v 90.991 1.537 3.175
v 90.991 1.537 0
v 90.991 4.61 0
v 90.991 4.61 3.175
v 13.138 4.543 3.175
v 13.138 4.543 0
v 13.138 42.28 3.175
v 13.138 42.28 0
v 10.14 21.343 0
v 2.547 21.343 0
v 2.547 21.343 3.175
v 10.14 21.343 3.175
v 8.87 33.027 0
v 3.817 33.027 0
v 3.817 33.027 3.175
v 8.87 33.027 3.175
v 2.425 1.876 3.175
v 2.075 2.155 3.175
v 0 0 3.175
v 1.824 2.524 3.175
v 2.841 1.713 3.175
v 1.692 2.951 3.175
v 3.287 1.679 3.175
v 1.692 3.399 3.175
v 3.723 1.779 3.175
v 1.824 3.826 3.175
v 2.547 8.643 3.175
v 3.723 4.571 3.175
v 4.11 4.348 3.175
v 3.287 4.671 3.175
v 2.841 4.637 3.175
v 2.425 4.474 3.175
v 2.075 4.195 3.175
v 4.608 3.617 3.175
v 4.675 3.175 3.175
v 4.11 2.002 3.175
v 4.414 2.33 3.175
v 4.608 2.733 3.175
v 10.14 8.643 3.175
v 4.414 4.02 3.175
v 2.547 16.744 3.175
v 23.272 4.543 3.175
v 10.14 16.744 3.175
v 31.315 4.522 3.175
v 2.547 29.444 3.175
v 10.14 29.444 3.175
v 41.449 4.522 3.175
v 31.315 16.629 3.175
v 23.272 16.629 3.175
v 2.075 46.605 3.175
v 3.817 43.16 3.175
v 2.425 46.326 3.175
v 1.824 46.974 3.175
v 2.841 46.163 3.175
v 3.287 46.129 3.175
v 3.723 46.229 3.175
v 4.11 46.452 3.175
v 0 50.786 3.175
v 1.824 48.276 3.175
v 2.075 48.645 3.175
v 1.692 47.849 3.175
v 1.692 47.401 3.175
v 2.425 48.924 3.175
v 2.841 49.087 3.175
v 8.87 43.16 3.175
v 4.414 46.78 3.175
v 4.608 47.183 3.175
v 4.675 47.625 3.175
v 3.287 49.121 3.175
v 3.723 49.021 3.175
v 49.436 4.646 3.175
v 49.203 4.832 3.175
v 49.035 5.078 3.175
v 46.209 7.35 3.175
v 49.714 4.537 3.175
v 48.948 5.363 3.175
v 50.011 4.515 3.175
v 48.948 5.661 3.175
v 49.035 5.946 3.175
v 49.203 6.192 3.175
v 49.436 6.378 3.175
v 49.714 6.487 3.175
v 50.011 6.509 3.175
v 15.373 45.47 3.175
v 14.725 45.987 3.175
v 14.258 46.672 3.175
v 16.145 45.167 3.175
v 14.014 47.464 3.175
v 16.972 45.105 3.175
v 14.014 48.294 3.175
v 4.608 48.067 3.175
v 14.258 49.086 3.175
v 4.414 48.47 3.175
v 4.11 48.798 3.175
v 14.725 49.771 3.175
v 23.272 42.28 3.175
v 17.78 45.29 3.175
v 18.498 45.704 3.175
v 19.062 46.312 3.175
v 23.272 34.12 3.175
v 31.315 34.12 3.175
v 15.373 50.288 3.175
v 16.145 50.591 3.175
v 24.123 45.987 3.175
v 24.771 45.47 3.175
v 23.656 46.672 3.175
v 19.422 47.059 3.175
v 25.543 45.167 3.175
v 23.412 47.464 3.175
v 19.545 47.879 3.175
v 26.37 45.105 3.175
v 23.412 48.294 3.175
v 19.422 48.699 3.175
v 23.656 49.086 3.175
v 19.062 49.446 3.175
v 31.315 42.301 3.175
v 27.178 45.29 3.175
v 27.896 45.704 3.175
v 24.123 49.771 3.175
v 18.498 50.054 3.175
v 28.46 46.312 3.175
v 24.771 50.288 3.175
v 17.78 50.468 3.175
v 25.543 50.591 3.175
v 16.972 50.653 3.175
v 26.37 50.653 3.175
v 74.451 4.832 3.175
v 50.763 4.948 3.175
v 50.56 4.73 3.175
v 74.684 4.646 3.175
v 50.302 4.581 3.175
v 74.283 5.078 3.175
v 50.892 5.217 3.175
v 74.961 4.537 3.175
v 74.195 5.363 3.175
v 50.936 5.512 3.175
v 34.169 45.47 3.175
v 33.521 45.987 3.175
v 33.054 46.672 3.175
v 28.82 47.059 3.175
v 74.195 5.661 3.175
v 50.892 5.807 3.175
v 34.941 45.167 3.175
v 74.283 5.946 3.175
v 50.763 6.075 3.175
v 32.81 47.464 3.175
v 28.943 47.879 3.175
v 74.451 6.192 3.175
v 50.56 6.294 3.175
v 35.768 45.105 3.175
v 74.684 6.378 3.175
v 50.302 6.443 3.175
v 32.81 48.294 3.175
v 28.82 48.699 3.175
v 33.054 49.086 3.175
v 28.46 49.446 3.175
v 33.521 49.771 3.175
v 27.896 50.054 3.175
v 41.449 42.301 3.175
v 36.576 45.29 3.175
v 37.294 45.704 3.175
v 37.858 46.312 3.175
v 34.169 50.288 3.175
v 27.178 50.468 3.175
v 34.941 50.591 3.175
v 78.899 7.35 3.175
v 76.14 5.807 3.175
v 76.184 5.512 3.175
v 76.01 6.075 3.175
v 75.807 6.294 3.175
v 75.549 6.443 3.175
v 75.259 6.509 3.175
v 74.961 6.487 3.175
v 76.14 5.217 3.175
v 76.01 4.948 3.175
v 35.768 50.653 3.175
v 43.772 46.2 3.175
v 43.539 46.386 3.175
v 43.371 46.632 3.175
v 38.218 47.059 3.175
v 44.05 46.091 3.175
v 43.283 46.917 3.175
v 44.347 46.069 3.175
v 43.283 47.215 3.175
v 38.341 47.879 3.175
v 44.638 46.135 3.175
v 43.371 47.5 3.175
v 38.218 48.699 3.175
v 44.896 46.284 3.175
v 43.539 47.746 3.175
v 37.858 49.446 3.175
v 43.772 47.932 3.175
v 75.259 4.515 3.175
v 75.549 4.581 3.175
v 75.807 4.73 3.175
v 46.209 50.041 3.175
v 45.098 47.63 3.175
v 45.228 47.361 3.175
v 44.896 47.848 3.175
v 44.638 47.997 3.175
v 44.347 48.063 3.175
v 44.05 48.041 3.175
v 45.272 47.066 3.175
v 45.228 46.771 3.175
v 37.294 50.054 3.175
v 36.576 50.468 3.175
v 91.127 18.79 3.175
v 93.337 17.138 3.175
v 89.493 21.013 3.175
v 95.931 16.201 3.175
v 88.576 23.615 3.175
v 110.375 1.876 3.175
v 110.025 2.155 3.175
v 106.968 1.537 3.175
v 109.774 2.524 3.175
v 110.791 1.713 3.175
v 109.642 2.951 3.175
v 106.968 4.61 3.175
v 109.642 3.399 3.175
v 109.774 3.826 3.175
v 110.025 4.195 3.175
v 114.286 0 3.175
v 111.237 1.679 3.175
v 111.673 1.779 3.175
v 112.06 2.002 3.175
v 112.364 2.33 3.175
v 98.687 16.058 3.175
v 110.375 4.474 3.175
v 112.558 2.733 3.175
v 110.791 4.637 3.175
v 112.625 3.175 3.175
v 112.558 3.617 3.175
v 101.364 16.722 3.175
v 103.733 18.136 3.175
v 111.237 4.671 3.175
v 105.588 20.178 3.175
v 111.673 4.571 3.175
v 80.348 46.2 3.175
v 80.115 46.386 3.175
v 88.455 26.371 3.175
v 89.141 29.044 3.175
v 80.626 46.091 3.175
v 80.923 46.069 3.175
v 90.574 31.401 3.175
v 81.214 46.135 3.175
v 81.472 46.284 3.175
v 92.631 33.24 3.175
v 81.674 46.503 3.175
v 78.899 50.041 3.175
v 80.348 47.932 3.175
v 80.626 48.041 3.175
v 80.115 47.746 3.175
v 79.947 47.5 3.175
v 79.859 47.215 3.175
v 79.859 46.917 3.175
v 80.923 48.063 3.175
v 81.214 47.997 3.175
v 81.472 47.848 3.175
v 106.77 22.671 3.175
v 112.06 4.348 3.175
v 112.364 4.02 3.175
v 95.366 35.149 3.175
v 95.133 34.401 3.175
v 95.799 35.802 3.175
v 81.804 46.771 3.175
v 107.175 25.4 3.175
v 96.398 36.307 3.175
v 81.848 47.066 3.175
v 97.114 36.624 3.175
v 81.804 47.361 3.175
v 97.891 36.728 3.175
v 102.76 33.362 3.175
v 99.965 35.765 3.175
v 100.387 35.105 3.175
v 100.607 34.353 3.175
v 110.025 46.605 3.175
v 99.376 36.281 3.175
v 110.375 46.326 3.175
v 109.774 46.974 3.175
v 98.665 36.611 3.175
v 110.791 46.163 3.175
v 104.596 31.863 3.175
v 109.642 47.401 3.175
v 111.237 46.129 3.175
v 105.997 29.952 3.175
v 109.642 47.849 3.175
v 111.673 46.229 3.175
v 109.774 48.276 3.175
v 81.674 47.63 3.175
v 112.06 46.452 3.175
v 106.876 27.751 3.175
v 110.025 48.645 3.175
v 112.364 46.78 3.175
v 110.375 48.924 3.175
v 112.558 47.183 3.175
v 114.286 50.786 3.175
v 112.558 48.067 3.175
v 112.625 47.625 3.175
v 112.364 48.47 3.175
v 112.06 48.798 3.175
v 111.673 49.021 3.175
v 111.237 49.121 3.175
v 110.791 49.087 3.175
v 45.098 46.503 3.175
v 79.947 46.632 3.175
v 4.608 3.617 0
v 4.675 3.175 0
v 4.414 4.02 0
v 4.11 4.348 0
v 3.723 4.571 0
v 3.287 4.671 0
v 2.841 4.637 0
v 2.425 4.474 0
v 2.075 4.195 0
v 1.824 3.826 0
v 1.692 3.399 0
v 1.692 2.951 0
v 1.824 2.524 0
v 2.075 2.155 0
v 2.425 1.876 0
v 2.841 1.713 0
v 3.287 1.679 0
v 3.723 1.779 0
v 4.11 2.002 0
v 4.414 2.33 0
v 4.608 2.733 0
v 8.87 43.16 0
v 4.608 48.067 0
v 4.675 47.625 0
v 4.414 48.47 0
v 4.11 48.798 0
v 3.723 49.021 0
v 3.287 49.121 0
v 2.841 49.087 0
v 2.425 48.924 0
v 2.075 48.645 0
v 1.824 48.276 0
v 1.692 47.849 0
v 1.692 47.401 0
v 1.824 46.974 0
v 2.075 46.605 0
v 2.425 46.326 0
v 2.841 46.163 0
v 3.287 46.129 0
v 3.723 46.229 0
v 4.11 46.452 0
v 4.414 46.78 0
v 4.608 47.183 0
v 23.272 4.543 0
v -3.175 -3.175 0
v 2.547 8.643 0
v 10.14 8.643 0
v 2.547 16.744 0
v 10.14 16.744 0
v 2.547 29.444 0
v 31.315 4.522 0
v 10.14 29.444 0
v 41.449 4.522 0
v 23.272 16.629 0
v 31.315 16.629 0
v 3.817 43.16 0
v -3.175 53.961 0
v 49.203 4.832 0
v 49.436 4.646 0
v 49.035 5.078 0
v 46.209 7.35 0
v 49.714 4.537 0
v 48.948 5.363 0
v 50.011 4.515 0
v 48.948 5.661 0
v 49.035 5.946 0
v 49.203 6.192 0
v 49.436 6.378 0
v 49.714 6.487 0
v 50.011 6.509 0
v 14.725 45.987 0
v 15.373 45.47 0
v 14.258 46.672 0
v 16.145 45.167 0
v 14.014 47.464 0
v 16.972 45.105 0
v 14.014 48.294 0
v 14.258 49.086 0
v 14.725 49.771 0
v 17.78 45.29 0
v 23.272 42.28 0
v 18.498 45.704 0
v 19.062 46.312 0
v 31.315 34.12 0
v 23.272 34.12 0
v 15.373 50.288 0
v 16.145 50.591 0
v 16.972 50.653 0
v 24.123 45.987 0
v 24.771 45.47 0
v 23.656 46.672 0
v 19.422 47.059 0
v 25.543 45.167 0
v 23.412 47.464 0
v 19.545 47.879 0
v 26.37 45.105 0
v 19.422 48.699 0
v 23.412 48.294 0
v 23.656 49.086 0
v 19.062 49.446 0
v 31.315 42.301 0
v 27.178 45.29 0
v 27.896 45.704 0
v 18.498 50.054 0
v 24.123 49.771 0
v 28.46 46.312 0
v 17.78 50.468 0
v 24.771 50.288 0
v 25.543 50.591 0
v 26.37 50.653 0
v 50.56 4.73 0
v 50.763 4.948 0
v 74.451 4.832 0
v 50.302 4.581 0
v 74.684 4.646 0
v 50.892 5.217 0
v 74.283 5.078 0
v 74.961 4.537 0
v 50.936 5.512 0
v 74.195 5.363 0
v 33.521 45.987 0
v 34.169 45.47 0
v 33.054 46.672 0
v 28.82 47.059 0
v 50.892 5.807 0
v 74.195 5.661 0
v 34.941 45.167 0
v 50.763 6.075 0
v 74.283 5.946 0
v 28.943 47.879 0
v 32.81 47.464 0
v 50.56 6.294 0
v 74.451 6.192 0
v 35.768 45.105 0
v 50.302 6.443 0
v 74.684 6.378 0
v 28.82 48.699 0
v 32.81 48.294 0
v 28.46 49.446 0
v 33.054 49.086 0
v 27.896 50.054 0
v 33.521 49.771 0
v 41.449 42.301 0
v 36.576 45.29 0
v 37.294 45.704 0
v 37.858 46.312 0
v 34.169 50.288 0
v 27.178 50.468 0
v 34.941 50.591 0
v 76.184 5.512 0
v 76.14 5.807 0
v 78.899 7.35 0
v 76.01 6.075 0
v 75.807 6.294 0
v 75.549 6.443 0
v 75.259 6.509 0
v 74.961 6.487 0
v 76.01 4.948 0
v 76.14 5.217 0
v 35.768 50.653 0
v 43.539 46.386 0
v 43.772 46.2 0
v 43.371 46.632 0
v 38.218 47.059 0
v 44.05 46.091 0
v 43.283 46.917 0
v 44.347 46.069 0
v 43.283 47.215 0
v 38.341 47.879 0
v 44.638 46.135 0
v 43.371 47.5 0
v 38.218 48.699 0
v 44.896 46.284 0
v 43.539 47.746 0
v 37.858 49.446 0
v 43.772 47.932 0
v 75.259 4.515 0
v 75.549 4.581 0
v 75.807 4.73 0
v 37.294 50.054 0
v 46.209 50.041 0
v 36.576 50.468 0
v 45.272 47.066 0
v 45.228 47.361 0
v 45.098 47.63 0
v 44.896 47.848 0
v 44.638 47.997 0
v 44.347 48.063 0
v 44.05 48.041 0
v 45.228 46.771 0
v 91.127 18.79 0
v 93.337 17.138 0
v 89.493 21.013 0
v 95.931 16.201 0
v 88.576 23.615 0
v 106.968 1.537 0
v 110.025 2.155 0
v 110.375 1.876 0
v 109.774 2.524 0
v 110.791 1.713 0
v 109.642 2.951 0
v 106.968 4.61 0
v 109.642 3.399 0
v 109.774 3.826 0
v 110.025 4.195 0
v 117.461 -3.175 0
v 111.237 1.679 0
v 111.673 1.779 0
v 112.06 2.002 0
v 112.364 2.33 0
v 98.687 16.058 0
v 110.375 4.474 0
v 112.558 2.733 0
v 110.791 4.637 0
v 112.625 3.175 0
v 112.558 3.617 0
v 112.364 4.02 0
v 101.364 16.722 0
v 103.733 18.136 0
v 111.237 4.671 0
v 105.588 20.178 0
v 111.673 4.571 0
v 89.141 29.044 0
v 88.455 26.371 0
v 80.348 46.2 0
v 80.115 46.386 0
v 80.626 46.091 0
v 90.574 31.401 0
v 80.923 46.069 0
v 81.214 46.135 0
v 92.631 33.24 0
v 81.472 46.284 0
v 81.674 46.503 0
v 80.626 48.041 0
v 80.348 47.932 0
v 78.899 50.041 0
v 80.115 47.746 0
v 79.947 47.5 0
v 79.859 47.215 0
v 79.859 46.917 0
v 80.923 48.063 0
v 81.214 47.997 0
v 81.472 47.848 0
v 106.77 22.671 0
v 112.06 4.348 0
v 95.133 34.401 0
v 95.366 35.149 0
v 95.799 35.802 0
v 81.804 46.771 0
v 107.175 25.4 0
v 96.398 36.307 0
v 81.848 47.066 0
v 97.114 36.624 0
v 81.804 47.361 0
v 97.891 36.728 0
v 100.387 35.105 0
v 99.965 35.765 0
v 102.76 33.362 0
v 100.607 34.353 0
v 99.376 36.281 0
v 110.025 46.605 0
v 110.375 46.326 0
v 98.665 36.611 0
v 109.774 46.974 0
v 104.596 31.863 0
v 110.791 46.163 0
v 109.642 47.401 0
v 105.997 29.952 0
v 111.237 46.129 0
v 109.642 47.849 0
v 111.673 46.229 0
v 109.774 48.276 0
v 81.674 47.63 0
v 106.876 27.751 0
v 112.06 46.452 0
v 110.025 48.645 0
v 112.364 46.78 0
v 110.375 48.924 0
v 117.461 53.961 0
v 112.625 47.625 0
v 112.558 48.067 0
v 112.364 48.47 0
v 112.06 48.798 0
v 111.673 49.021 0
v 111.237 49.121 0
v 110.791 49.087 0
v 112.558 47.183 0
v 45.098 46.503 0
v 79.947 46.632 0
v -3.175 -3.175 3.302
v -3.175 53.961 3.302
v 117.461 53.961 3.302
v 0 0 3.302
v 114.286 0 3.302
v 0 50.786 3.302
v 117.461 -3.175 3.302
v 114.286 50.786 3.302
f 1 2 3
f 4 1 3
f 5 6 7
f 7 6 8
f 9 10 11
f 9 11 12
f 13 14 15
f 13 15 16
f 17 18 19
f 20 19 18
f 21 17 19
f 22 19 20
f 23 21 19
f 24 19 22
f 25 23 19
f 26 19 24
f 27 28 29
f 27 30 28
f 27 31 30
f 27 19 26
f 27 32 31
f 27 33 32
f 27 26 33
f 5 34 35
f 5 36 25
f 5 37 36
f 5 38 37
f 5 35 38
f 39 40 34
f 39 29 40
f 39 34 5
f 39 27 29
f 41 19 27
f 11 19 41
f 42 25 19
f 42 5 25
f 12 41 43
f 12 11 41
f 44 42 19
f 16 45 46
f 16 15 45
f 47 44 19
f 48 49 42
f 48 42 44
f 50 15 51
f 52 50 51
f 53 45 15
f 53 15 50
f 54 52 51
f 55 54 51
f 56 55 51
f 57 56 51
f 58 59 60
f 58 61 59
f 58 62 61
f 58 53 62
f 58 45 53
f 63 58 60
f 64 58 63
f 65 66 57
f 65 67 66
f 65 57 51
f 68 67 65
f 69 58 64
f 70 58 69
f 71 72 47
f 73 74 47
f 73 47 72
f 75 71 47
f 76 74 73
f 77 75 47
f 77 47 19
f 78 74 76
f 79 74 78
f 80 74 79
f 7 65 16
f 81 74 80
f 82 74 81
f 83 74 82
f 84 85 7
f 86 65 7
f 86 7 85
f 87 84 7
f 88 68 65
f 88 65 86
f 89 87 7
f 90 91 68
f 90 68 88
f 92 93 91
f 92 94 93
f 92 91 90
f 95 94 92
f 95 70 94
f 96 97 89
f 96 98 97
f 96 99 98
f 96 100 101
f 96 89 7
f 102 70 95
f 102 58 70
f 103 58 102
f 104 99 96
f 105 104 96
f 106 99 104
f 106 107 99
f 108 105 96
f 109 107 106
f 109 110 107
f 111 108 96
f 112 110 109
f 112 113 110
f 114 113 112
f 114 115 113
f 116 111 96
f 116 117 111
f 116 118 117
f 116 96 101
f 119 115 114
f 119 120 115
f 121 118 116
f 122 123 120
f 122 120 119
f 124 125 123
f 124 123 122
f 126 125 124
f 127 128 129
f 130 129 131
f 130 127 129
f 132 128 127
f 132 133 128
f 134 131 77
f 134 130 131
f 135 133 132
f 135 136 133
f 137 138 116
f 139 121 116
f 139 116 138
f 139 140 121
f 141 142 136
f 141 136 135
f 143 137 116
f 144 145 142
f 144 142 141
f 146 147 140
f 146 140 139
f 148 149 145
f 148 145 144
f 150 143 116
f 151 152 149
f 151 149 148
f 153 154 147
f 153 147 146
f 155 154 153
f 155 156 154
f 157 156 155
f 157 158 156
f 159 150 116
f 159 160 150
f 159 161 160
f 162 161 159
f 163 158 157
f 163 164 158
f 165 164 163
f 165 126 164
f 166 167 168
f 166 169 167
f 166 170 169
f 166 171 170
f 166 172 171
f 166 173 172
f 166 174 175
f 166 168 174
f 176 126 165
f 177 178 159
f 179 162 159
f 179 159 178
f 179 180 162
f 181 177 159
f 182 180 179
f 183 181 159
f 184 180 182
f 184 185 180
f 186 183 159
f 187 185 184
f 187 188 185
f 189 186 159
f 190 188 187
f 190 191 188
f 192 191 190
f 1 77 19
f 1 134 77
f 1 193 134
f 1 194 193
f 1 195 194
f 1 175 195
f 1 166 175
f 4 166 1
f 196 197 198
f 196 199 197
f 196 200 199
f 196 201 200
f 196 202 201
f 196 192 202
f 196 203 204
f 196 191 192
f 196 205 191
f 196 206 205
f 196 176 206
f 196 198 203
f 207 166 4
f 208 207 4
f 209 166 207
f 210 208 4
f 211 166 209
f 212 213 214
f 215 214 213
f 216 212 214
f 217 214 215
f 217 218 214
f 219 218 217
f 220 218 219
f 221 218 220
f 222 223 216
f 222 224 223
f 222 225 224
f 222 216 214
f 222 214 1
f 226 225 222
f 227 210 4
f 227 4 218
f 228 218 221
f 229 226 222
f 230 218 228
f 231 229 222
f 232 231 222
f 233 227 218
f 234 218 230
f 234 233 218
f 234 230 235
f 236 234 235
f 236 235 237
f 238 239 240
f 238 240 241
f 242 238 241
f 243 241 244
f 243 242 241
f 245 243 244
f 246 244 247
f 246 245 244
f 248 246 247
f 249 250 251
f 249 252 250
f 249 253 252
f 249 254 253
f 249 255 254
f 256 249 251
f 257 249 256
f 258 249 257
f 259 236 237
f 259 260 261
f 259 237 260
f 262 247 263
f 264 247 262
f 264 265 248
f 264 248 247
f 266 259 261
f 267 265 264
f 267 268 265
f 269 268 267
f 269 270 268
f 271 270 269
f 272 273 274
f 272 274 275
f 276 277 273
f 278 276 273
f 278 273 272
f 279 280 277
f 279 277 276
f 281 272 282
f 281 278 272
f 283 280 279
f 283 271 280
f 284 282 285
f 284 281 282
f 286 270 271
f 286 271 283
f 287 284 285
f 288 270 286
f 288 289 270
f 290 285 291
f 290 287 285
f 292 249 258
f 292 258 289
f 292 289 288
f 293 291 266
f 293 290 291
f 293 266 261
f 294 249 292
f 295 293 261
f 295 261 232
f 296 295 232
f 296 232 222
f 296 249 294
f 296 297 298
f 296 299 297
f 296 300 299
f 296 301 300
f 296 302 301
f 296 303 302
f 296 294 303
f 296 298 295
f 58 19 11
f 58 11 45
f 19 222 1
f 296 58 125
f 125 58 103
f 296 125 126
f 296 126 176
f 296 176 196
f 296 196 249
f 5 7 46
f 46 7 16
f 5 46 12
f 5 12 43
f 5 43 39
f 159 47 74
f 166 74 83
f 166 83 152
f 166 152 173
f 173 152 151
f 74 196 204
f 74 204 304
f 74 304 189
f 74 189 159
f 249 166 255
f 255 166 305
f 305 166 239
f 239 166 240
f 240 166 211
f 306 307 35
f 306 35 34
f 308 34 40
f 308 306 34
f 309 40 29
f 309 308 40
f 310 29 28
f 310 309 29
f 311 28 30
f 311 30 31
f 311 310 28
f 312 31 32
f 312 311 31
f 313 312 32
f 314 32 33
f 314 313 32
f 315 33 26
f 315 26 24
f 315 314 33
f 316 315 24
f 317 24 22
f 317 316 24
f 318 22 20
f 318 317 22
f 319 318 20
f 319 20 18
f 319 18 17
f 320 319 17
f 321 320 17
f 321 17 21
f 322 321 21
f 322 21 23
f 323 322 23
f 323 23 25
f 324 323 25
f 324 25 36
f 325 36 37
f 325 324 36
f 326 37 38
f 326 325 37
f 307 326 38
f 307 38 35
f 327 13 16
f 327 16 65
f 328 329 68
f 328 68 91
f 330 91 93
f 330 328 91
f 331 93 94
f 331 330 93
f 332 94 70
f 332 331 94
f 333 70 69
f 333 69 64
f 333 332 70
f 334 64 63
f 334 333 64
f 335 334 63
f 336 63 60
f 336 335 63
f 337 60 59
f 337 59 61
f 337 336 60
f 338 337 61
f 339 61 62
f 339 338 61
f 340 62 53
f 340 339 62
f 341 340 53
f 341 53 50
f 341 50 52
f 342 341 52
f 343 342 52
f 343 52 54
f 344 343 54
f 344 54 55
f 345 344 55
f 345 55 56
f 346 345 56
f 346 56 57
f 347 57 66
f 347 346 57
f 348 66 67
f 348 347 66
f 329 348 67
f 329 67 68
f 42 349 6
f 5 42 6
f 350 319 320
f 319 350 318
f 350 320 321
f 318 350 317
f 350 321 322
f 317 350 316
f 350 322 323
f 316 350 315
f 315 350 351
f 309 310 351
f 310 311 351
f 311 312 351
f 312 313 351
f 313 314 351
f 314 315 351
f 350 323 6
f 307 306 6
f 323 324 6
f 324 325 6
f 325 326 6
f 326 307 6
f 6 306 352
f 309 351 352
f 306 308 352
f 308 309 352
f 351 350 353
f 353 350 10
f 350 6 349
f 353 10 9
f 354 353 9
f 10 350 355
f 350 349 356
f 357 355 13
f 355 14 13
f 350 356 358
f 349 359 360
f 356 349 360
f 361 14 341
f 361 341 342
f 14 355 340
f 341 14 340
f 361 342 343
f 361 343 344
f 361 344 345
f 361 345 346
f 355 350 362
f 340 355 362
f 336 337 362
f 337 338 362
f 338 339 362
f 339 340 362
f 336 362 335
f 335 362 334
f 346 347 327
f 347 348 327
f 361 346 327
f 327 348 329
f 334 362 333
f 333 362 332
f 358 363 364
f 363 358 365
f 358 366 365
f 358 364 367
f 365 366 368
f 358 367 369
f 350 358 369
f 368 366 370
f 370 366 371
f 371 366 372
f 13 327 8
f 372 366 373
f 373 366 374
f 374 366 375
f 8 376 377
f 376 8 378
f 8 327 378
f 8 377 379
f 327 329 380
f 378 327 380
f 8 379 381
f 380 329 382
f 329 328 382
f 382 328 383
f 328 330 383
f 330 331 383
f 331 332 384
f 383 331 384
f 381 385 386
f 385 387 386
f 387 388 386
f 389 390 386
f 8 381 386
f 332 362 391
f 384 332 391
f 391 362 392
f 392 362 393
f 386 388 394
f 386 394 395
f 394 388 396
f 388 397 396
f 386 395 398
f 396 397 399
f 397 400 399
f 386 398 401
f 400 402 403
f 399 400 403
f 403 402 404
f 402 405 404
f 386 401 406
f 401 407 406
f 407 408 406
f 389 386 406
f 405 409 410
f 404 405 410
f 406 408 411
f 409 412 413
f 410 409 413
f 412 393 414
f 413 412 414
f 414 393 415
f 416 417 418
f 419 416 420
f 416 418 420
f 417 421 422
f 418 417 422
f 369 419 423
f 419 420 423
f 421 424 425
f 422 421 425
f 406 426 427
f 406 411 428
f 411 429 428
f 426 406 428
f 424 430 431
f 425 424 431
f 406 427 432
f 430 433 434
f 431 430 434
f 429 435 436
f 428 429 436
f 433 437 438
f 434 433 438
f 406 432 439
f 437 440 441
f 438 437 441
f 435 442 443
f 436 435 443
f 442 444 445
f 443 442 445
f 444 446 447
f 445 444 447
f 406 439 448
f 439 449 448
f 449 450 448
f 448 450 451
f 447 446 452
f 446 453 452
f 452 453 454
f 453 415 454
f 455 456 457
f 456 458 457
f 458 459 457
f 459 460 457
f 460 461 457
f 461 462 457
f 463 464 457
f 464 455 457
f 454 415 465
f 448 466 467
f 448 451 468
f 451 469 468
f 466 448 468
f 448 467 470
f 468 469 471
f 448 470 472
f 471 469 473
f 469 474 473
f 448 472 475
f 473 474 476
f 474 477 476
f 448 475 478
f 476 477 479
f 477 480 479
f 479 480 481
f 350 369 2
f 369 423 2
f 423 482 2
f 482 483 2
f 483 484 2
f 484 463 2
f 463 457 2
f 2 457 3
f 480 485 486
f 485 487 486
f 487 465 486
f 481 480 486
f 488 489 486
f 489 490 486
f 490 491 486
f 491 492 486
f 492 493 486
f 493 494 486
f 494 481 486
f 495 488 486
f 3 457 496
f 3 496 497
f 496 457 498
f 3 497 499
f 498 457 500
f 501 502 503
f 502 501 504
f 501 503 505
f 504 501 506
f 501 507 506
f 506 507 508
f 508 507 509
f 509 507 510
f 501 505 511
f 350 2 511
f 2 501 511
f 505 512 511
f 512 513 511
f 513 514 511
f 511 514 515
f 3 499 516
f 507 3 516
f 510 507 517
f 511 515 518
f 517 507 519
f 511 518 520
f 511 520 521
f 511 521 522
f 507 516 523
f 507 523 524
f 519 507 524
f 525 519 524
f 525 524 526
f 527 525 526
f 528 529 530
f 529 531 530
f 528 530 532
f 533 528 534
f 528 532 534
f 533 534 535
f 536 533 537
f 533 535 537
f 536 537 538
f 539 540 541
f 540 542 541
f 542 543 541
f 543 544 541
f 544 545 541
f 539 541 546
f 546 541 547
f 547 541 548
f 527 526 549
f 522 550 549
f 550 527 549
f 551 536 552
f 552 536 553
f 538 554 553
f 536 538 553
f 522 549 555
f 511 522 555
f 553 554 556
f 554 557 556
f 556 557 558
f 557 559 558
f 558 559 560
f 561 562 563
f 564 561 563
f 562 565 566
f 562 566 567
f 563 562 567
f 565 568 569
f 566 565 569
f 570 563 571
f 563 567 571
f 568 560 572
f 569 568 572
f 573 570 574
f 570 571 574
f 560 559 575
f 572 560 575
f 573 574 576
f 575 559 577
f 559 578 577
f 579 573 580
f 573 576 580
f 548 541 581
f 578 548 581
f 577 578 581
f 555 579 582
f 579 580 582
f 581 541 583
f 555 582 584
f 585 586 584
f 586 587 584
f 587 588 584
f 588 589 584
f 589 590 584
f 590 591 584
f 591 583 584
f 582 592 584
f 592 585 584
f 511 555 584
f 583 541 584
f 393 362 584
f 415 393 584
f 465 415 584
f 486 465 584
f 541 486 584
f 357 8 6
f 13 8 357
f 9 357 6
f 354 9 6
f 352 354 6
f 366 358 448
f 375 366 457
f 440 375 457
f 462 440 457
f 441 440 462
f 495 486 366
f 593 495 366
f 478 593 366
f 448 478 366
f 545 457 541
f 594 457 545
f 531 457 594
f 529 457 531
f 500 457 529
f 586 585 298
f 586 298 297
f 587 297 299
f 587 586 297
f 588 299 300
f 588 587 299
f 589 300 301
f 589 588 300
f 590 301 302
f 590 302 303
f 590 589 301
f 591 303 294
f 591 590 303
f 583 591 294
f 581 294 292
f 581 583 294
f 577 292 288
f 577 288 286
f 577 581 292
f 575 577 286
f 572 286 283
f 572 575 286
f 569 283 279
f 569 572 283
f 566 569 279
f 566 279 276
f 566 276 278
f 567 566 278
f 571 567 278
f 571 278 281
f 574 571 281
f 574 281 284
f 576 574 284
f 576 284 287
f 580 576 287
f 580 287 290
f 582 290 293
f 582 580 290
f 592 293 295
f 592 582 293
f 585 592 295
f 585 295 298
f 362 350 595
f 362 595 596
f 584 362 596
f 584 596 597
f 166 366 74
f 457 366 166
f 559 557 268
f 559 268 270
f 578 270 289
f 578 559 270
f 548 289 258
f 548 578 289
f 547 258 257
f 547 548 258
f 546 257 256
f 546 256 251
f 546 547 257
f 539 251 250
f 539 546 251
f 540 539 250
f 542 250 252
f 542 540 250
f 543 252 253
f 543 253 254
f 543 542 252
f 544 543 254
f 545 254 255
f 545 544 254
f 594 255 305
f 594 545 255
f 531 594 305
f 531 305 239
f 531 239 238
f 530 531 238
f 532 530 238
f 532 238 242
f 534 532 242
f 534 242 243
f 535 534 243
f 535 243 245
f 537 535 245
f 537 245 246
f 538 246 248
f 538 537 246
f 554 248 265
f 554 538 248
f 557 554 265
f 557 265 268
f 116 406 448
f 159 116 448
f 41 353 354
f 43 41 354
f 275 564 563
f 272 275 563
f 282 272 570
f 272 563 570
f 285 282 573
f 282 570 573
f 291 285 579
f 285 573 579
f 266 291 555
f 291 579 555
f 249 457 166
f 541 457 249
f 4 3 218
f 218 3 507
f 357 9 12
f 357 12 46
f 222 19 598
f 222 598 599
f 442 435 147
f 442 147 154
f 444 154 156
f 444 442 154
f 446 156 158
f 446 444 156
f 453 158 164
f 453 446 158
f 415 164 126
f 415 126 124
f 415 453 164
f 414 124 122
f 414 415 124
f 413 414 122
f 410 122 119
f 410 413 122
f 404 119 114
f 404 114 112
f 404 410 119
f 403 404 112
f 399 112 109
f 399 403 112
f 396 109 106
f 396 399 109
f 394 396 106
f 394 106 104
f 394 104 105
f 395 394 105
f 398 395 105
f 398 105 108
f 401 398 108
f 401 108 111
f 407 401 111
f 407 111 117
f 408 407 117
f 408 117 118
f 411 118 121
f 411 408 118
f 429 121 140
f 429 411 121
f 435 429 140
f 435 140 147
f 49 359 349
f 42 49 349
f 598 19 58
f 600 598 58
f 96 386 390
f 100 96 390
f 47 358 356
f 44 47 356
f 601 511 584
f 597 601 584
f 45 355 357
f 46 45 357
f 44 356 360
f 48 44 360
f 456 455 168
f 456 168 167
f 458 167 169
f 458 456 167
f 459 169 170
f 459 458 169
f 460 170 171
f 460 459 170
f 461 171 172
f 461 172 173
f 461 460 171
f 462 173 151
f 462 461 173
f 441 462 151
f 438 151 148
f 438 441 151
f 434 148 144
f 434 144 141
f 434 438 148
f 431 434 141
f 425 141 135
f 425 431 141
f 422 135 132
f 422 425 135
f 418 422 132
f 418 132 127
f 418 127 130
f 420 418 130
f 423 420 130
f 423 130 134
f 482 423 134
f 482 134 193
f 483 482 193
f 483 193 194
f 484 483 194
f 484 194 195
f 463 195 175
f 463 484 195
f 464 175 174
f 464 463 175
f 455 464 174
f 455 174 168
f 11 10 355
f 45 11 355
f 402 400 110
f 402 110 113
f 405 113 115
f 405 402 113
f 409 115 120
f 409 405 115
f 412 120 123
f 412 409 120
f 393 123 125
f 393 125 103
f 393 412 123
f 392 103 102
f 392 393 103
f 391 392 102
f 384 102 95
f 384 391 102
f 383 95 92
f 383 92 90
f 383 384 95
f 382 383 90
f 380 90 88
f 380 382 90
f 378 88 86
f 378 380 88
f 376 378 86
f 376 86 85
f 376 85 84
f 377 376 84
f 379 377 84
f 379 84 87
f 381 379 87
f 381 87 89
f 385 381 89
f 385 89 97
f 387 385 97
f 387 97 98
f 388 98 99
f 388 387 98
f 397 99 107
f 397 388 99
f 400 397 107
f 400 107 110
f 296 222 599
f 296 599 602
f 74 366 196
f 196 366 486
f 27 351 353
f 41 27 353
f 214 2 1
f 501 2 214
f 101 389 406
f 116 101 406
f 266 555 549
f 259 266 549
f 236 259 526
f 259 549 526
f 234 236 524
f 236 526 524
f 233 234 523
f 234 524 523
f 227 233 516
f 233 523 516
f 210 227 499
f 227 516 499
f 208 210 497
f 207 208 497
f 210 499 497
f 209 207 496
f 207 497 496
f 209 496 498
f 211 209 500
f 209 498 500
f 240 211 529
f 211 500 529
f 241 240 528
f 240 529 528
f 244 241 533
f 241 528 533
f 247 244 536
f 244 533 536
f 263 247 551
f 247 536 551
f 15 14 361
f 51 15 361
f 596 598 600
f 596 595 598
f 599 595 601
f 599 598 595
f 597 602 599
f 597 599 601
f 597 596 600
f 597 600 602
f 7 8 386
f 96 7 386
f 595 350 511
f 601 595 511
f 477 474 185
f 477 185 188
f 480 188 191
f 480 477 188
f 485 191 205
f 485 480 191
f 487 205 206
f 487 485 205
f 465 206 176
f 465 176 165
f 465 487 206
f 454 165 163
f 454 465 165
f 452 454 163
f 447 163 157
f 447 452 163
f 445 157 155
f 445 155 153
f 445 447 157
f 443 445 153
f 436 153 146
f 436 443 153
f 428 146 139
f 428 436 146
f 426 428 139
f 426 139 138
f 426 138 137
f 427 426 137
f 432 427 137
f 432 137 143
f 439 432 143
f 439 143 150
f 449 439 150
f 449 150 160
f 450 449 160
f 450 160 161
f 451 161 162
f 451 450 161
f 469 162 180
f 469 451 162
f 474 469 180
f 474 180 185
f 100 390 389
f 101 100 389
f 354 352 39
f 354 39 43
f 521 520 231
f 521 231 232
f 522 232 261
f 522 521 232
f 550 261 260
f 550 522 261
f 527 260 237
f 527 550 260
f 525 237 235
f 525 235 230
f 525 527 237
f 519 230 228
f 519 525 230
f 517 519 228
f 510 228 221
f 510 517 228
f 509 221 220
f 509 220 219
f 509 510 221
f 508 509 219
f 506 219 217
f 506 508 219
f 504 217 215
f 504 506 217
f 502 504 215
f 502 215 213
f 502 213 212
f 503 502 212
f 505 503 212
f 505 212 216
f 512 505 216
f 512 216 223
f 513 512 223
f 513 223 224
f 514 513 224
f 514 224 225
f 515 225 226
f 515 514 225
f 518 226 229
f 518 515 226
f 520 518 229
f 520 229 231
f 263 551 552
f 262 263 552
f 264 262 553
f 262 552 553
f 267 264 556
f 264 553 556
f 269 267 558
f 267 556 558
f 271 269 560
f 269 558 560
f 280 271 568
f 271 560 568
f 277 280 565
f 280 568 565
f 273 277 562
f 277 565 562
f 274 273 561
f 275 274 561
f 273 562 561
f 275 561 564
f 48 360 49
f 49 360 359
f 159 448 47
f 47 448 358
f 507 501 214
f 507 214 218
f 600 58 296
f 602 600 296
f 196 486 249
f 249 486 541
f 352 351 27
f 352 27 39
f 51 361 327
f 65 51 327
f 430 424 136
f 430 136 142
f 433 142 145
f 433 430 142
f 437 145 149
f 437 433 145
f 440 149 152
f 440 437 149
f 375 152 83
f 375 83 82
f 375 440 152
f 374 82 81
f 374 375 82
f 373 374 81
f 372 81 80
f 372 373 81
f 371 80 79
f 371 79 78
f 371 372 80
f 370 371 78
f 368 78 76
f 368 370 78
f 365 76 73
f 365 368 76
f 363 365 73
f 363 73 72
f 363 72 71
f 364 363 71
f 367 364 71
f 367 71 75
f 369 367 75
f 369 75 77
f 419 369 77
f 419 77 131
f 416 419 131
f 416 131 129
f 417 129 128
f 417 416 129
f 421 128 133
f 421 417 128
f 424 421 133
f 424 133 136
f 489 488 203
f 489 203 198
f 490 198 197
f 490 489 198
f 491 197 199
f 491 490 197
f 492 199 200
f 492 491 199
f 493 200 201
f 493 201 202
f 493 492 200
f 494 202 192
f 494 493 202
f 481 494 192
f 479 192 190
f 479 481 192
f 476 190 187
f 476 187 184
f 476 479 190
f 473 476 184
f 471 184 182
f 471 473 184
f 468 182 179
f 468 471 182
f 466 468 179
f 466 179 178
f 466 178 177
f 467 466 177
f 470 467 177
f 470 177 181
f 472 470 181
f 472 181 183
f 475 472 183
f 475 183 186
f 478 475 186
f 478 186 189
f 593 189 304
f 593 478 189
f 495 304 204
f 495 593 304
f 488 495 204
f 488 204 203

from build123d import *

# Parameters (mm, degrees)
MODEL_W             = 114.2864
MODEL_H             = 50.7864
MODEL_R             = 1.5
MODEL_W_2           = 7.5932
MODEL_H_2           = 8.1012
MODEL_R_2           = 1
MODEL_W_3           = 15.9766
MODEL_H_3           = 3.0734
MODEL_W_4           = 5.0528
MODEL_H_4           = 10.132799902
MODEL_R_3           = 2.7813
MODEL_W_5           = 32.6908
MODEL_H_5           = 42.6908
BOSS_EXTRUDE1_DEPTH = 3.175
SKETCH1_W           = 120.636394244
SKETCH1_H           = 57.136394614
SKETCH1_W_2         = 114.2864
SKETCH1_H_2         = 50.7864
BOSS_EXTRUDE2_DEPTH = 3.302


with BuildPart() as part:
    # Model → Boss-Extrude1 (new body)
    with BuildSketch(Plane.XY):
        with Locations((57.143197122, 25.393197307)):
            Rectangle(MODEL_W, MODEL_H)
        with Locations((3.175, 3.175)):
            Circle(MODEL_R, mode=Mode.SUBTRACT)
        with Locations((6.343197122, 12.693197307)):
            Rectangle(MODEL_W_2, MODEL_H_2, mode=Mode.SUBTRACT)
        with Locations((49.9364, 5.5118)):
            Circle(MODEL_R_2, mode=Mode.SUBTRACT)
        with Locations((6.343197122, 25.393197307)):
            Rectangle(MODEL_W_2, MODEL_H_2, mode=Mode.SUBTRACT)
        Polygon((23.272097122, 4.543497307), (13.137897122, 4.543497307), (13.137897122, 42.280497307), (23.272097122, 42.280497307), (23.272097122, 34.120497307), (31.314978679, 34.120497307), (31.314978679, 42.301497307), (41.449178679, 42.301497307), (41.449178679, 4.522497307), (31.314978679, 4.522497307), (31.314978679, 16.629297307), (23.272097122, 16.629297307), align=None, mode=Mode.SUBTRACT)
        with Locations((75.184, 5.5118)):
            Circle(MODEL_R_2, mode=Mode.SUBTRACT)
        with Locations((98.979297122, 3.0734)):
            Rectangle(MODEL_W_3, MODEL_H_3, mode=Mode.SUBTRACT)
        with Locations((111.125, 3.175)):
            Circle(MODEL_R, mode=Mode.SUBTRACT)
        with Locations((6.343197122, 38.093197307)):
            Rectangle(MODEL_W_4, MODEL_H_4, mode=Mode.SUBTRACT)
        with Locations((3.175, 47.625)):
            Circle(MODEL_R, mode=Mode.SUBTRACT)
        with Locations((16.764, 47.879)):
            Circle(MODEL_R_3, mode=Mode.SUBTRACT)
        with Locations((26.162, 47.879)):
            Circle(MODEL_R_3, mode=Mode.SUBTRACT)
        with Locations((35.56, 47.879)):
            Circle(MODEL_R_3, mode=Mode.SUBTRACT)
        with Locations((44.2722, 47.0662)):
            Circle(MODEL_R_2, mode=Mode.SUBTRACT)
        with Locations((62.553997122, 28.695197307)):
            Rectangle(MODEL_W_5, MODEL_H_5, mode=Mode.SUBTRACT)
        with BuildLine():
            ThreePointArc((100.60678971, 34.352628207), (105.35704277, 30.951911366), (107.1753, 25.4))
            ThreePointArc((107.1753, 25.4), (92.170948878, 17.88267863), (95.133038042, 34.401355967))
            ThreePointArc((95.133038042, 34.401355967), (97.890845314, 36.728290305), (100.60678971, 34.352628207))
        make_face(mode=Mode.SUBTRACT)
        with Locations((80.8482, 47.0662)):
            Circle(MODEL_R_2, mode=Mode.SUBTRACT)
        with Locations((111.125, 47.625)):
            Circle(MODEL_R, mode=Mode.SUBTRACT)
    extrude(amount=BOSS_EXTRUDE1_DEPTH)

    # Sketch1 → Boss-Extrude2 (add)
    with BuildSketch(Plane.XY):
        with Locations((57.143197122, 25.393197307)):
            Rectangle(SKETCH1_W, SKETCH1_H)
        with Locations((57.143197122, 25.393197307)):
            Rectangle(SKETCH1_W_2, SKETCH1_H_2, mode=Mode.SUBTRACT)
    extrude(amount=BOSS_EXTRUDE2_DEPTH)


solid = part.part
